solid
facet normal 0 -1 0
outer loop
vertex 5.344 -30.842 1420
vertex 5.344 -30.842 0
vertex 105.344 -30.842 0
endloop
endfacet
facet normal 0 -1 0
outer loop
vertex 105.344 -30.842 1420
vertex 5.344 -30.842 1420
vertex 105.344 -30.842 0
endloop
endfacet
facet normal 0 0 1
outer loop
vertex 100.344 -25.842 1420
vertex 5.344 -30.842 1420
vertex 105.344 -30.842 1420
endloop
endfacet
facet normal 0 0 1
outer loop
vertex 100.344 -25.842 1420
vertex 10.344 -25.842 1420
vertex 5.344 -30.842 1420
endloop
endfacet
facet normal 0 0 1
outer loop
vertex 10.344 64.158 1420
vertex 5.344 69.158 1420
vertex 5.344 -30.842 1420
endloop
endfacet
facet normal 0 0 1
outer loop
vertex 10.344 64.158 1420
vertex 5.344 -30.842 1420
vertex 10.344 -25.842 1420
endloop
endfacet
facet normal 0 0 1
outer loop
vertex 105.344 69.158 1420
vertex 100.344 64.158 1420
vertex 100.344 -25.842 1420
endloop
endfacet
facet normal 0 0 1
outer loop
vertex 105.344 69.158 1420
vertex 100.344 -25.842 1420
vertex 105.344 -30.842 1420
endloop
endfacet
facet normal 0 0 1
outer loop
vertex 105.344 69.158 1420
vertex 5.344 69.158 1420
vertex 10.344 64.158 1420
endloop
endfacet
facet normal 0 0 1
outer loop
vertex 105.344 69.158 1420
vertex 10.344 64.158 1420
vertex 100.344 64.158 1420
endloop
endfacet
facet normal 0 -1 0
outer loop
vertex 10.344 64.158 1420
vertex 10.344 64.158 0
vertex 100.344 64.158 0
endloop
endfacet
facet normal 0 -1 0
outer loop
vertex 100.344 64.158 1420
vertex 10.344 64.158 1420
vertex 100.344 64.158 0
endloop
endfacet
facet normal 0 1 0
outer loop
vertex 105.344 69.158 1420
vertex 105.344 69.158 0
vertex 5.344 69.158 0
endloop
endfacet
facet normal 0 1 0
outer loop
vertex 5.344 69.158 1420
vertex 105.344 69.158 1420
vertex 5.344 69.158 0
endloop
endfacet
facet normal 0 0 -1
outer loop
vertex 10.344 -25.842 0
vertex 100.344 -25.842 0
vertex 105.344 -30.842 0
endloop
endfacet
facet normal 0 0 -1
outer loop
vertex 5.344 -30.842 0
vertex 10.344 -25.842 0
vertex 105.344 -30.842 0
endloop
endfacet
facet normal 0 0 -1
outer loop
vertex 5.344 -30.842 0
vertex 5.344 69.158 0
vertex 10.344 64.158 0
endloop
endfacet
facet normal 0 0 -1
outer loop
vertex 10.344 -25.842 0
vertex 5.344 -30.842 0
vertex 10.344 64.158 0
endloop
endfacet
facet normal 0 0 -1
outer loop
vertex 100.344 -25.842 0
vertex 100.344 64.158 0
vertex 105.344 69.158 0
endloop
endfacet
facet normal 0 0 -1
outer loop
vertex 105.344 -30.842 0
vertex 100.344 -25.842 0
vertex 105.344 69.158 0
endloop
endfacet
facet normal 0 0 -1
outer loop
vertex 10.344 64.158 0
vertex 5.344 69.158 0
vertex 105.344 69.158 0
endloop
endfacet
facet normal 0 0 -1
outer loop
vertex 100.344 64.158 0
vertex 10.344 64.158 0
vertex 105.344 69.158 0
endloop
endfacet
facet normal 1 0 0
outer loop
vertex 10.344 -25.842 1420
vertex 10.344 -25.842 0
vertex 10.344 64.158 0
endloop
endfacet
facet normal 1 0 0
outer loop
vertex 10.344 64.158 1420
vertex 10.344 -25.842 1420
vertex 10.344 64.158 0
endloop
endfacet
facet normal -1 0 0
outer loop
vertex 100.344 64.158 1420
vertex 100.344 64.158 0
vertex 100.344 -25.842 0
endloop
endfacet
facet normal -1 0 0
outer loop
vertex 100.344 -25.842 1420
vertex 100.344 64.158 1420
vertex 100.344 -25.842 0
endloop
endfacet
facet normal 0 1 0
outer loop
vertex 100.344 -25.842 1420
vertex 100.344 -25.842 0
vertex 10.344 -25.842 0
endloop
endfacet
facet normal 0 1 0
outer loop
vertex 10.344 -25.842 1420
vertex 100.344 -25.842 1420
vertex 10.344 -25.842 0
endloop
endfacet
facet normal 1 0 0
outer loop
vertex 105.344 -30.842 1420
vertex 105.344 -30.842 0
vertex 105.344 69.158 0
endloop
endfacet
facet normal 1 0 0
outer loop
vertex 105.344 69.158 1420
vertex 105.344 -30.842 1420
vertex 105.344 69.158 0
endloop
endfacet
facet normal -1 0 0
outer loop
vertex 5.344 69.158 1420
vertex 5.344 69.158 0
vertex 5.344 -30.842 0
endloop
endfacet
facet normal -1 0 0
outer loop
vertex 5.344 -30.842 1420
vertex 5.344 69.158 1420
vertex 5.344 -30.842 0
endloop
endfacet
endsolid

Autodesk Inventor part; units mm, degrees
ref_plane "YZ Plane" through (0, 0, 0) normal (1, 0, 0) x (0, 1, 0)
ref_plane "XZ Plane" through (0, 0, 0) normal (0, 1, 0) x (-1, 0, 0)
ref_plane "XY Plane" through (0, 0, 0) normal (0, 0, 1) x (1, 0, 0)
sketch "Sketch1" plane through (0, 0, 0) normal (0, 0, 1) x (1, 0, 0)
  line L0 (5.3443, -30.8421) -> (105.3443, -30.8421)
  line L1 (105.3443, -30.8421) -> (105.3443, 69.1579)
  line L2 (105.3443, 69.1579) -> (5.3443, 69.1579)
  line L3 (5.3443, 69.1579) -> (5.3443, -30.8421)
  line L4 (10.3443, 64.1579) -> (100.3443, 64.1579)
  line L5 (100.3443, 64.1579) -> (100.3443, -25.8421)
  line L6 (100.3443, -25.8421) -> (10.3443, -25.8421)
  line L7 (10.3443, -25.8421) -> (10.3443, 64.1579)
  point P0 (0, 0)
  dimension "d0" = 100
  dimension "d1" = 100
  dimension "d2" = 5
  dimension "d3" = 5
  dimension "d4" = 5
  dimension "d5" = 5
extrude "Extrusion1" add sketch "Sketch1" along normal blind 1420
properties part number "bluethingfortable"
